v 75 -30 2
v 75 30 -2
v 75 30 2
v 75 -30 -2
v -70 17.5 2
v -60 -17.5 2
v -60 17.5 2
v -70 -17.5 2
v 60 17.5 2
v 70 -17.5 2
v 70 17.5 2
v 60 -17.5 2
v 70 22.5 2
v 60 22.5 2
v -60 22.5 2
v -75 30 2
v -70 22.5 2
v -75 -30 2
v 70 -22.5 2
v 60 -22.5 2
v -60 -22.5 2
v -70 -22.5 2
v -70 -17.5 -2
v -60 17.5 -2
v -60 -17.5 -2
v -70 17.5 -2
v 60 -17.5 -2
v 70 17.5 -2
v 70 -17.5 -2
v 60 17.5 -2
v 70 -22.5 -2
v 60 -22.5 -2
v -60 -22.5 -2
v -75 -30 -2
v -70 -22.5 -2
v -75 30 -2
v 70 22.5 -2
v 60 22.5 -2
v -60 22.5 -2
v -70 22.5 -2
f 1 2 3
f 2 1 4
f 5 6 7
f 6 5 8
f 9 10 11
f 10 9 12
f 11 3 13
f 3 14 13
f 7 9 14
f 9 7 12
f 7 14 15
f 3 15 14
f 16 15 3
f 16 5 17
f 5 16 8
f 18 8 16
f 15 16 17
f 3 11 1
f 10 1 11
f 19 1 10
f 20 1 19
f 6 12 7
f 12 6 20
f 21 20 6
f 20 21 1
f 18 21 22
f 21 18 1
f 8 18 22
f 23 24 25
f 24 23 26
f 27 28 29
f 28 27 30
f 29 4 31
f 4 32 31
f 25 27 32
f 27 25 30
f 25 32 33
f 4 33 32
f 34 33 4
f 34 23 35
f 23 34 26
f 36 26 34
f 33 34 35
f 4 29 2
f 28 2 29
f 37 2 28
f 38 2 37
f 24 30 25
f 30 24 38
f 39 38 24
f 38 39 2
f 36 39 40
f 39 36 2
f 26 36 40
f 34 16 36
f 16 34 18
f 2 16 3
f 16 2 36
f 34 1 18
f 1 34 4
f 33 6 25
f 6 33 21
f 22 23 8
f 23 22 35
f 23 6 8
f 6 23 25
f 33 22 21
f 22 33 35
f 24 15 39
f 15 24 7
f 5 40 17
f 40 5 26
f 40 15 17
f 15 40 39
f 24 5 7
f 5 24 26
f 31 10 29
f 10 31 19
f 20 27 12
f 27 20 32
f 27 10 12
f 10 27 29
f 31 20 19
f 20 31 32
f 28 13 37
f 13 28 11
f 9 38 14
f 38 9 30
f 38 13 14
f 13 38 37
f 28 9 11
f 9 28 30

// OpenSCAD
// ========================================
// a 150 x 60 x 4 mm plate with four 10 x 5 mm slots
// NeuroCAD canonical IR; dimensions are millimetres
// ========================================
$fn = 48;

difference() {
  cube(size=[150, 60, 4], center=true);
  translate([-65, -20, 0]) {
    cube(size=[10, 5, 6], center=true);
  }
  translate([-65, 20, 0]) {
    cube(size=[10, 5, 6], center=true);
  }
  translate([65, -20, 0]) {
    cube(size=[10, 5, 6], center=true);
  }
  translate([65, 20, 0]) {
    cube(size=[10, 5, 6], center=true);
  }
}
